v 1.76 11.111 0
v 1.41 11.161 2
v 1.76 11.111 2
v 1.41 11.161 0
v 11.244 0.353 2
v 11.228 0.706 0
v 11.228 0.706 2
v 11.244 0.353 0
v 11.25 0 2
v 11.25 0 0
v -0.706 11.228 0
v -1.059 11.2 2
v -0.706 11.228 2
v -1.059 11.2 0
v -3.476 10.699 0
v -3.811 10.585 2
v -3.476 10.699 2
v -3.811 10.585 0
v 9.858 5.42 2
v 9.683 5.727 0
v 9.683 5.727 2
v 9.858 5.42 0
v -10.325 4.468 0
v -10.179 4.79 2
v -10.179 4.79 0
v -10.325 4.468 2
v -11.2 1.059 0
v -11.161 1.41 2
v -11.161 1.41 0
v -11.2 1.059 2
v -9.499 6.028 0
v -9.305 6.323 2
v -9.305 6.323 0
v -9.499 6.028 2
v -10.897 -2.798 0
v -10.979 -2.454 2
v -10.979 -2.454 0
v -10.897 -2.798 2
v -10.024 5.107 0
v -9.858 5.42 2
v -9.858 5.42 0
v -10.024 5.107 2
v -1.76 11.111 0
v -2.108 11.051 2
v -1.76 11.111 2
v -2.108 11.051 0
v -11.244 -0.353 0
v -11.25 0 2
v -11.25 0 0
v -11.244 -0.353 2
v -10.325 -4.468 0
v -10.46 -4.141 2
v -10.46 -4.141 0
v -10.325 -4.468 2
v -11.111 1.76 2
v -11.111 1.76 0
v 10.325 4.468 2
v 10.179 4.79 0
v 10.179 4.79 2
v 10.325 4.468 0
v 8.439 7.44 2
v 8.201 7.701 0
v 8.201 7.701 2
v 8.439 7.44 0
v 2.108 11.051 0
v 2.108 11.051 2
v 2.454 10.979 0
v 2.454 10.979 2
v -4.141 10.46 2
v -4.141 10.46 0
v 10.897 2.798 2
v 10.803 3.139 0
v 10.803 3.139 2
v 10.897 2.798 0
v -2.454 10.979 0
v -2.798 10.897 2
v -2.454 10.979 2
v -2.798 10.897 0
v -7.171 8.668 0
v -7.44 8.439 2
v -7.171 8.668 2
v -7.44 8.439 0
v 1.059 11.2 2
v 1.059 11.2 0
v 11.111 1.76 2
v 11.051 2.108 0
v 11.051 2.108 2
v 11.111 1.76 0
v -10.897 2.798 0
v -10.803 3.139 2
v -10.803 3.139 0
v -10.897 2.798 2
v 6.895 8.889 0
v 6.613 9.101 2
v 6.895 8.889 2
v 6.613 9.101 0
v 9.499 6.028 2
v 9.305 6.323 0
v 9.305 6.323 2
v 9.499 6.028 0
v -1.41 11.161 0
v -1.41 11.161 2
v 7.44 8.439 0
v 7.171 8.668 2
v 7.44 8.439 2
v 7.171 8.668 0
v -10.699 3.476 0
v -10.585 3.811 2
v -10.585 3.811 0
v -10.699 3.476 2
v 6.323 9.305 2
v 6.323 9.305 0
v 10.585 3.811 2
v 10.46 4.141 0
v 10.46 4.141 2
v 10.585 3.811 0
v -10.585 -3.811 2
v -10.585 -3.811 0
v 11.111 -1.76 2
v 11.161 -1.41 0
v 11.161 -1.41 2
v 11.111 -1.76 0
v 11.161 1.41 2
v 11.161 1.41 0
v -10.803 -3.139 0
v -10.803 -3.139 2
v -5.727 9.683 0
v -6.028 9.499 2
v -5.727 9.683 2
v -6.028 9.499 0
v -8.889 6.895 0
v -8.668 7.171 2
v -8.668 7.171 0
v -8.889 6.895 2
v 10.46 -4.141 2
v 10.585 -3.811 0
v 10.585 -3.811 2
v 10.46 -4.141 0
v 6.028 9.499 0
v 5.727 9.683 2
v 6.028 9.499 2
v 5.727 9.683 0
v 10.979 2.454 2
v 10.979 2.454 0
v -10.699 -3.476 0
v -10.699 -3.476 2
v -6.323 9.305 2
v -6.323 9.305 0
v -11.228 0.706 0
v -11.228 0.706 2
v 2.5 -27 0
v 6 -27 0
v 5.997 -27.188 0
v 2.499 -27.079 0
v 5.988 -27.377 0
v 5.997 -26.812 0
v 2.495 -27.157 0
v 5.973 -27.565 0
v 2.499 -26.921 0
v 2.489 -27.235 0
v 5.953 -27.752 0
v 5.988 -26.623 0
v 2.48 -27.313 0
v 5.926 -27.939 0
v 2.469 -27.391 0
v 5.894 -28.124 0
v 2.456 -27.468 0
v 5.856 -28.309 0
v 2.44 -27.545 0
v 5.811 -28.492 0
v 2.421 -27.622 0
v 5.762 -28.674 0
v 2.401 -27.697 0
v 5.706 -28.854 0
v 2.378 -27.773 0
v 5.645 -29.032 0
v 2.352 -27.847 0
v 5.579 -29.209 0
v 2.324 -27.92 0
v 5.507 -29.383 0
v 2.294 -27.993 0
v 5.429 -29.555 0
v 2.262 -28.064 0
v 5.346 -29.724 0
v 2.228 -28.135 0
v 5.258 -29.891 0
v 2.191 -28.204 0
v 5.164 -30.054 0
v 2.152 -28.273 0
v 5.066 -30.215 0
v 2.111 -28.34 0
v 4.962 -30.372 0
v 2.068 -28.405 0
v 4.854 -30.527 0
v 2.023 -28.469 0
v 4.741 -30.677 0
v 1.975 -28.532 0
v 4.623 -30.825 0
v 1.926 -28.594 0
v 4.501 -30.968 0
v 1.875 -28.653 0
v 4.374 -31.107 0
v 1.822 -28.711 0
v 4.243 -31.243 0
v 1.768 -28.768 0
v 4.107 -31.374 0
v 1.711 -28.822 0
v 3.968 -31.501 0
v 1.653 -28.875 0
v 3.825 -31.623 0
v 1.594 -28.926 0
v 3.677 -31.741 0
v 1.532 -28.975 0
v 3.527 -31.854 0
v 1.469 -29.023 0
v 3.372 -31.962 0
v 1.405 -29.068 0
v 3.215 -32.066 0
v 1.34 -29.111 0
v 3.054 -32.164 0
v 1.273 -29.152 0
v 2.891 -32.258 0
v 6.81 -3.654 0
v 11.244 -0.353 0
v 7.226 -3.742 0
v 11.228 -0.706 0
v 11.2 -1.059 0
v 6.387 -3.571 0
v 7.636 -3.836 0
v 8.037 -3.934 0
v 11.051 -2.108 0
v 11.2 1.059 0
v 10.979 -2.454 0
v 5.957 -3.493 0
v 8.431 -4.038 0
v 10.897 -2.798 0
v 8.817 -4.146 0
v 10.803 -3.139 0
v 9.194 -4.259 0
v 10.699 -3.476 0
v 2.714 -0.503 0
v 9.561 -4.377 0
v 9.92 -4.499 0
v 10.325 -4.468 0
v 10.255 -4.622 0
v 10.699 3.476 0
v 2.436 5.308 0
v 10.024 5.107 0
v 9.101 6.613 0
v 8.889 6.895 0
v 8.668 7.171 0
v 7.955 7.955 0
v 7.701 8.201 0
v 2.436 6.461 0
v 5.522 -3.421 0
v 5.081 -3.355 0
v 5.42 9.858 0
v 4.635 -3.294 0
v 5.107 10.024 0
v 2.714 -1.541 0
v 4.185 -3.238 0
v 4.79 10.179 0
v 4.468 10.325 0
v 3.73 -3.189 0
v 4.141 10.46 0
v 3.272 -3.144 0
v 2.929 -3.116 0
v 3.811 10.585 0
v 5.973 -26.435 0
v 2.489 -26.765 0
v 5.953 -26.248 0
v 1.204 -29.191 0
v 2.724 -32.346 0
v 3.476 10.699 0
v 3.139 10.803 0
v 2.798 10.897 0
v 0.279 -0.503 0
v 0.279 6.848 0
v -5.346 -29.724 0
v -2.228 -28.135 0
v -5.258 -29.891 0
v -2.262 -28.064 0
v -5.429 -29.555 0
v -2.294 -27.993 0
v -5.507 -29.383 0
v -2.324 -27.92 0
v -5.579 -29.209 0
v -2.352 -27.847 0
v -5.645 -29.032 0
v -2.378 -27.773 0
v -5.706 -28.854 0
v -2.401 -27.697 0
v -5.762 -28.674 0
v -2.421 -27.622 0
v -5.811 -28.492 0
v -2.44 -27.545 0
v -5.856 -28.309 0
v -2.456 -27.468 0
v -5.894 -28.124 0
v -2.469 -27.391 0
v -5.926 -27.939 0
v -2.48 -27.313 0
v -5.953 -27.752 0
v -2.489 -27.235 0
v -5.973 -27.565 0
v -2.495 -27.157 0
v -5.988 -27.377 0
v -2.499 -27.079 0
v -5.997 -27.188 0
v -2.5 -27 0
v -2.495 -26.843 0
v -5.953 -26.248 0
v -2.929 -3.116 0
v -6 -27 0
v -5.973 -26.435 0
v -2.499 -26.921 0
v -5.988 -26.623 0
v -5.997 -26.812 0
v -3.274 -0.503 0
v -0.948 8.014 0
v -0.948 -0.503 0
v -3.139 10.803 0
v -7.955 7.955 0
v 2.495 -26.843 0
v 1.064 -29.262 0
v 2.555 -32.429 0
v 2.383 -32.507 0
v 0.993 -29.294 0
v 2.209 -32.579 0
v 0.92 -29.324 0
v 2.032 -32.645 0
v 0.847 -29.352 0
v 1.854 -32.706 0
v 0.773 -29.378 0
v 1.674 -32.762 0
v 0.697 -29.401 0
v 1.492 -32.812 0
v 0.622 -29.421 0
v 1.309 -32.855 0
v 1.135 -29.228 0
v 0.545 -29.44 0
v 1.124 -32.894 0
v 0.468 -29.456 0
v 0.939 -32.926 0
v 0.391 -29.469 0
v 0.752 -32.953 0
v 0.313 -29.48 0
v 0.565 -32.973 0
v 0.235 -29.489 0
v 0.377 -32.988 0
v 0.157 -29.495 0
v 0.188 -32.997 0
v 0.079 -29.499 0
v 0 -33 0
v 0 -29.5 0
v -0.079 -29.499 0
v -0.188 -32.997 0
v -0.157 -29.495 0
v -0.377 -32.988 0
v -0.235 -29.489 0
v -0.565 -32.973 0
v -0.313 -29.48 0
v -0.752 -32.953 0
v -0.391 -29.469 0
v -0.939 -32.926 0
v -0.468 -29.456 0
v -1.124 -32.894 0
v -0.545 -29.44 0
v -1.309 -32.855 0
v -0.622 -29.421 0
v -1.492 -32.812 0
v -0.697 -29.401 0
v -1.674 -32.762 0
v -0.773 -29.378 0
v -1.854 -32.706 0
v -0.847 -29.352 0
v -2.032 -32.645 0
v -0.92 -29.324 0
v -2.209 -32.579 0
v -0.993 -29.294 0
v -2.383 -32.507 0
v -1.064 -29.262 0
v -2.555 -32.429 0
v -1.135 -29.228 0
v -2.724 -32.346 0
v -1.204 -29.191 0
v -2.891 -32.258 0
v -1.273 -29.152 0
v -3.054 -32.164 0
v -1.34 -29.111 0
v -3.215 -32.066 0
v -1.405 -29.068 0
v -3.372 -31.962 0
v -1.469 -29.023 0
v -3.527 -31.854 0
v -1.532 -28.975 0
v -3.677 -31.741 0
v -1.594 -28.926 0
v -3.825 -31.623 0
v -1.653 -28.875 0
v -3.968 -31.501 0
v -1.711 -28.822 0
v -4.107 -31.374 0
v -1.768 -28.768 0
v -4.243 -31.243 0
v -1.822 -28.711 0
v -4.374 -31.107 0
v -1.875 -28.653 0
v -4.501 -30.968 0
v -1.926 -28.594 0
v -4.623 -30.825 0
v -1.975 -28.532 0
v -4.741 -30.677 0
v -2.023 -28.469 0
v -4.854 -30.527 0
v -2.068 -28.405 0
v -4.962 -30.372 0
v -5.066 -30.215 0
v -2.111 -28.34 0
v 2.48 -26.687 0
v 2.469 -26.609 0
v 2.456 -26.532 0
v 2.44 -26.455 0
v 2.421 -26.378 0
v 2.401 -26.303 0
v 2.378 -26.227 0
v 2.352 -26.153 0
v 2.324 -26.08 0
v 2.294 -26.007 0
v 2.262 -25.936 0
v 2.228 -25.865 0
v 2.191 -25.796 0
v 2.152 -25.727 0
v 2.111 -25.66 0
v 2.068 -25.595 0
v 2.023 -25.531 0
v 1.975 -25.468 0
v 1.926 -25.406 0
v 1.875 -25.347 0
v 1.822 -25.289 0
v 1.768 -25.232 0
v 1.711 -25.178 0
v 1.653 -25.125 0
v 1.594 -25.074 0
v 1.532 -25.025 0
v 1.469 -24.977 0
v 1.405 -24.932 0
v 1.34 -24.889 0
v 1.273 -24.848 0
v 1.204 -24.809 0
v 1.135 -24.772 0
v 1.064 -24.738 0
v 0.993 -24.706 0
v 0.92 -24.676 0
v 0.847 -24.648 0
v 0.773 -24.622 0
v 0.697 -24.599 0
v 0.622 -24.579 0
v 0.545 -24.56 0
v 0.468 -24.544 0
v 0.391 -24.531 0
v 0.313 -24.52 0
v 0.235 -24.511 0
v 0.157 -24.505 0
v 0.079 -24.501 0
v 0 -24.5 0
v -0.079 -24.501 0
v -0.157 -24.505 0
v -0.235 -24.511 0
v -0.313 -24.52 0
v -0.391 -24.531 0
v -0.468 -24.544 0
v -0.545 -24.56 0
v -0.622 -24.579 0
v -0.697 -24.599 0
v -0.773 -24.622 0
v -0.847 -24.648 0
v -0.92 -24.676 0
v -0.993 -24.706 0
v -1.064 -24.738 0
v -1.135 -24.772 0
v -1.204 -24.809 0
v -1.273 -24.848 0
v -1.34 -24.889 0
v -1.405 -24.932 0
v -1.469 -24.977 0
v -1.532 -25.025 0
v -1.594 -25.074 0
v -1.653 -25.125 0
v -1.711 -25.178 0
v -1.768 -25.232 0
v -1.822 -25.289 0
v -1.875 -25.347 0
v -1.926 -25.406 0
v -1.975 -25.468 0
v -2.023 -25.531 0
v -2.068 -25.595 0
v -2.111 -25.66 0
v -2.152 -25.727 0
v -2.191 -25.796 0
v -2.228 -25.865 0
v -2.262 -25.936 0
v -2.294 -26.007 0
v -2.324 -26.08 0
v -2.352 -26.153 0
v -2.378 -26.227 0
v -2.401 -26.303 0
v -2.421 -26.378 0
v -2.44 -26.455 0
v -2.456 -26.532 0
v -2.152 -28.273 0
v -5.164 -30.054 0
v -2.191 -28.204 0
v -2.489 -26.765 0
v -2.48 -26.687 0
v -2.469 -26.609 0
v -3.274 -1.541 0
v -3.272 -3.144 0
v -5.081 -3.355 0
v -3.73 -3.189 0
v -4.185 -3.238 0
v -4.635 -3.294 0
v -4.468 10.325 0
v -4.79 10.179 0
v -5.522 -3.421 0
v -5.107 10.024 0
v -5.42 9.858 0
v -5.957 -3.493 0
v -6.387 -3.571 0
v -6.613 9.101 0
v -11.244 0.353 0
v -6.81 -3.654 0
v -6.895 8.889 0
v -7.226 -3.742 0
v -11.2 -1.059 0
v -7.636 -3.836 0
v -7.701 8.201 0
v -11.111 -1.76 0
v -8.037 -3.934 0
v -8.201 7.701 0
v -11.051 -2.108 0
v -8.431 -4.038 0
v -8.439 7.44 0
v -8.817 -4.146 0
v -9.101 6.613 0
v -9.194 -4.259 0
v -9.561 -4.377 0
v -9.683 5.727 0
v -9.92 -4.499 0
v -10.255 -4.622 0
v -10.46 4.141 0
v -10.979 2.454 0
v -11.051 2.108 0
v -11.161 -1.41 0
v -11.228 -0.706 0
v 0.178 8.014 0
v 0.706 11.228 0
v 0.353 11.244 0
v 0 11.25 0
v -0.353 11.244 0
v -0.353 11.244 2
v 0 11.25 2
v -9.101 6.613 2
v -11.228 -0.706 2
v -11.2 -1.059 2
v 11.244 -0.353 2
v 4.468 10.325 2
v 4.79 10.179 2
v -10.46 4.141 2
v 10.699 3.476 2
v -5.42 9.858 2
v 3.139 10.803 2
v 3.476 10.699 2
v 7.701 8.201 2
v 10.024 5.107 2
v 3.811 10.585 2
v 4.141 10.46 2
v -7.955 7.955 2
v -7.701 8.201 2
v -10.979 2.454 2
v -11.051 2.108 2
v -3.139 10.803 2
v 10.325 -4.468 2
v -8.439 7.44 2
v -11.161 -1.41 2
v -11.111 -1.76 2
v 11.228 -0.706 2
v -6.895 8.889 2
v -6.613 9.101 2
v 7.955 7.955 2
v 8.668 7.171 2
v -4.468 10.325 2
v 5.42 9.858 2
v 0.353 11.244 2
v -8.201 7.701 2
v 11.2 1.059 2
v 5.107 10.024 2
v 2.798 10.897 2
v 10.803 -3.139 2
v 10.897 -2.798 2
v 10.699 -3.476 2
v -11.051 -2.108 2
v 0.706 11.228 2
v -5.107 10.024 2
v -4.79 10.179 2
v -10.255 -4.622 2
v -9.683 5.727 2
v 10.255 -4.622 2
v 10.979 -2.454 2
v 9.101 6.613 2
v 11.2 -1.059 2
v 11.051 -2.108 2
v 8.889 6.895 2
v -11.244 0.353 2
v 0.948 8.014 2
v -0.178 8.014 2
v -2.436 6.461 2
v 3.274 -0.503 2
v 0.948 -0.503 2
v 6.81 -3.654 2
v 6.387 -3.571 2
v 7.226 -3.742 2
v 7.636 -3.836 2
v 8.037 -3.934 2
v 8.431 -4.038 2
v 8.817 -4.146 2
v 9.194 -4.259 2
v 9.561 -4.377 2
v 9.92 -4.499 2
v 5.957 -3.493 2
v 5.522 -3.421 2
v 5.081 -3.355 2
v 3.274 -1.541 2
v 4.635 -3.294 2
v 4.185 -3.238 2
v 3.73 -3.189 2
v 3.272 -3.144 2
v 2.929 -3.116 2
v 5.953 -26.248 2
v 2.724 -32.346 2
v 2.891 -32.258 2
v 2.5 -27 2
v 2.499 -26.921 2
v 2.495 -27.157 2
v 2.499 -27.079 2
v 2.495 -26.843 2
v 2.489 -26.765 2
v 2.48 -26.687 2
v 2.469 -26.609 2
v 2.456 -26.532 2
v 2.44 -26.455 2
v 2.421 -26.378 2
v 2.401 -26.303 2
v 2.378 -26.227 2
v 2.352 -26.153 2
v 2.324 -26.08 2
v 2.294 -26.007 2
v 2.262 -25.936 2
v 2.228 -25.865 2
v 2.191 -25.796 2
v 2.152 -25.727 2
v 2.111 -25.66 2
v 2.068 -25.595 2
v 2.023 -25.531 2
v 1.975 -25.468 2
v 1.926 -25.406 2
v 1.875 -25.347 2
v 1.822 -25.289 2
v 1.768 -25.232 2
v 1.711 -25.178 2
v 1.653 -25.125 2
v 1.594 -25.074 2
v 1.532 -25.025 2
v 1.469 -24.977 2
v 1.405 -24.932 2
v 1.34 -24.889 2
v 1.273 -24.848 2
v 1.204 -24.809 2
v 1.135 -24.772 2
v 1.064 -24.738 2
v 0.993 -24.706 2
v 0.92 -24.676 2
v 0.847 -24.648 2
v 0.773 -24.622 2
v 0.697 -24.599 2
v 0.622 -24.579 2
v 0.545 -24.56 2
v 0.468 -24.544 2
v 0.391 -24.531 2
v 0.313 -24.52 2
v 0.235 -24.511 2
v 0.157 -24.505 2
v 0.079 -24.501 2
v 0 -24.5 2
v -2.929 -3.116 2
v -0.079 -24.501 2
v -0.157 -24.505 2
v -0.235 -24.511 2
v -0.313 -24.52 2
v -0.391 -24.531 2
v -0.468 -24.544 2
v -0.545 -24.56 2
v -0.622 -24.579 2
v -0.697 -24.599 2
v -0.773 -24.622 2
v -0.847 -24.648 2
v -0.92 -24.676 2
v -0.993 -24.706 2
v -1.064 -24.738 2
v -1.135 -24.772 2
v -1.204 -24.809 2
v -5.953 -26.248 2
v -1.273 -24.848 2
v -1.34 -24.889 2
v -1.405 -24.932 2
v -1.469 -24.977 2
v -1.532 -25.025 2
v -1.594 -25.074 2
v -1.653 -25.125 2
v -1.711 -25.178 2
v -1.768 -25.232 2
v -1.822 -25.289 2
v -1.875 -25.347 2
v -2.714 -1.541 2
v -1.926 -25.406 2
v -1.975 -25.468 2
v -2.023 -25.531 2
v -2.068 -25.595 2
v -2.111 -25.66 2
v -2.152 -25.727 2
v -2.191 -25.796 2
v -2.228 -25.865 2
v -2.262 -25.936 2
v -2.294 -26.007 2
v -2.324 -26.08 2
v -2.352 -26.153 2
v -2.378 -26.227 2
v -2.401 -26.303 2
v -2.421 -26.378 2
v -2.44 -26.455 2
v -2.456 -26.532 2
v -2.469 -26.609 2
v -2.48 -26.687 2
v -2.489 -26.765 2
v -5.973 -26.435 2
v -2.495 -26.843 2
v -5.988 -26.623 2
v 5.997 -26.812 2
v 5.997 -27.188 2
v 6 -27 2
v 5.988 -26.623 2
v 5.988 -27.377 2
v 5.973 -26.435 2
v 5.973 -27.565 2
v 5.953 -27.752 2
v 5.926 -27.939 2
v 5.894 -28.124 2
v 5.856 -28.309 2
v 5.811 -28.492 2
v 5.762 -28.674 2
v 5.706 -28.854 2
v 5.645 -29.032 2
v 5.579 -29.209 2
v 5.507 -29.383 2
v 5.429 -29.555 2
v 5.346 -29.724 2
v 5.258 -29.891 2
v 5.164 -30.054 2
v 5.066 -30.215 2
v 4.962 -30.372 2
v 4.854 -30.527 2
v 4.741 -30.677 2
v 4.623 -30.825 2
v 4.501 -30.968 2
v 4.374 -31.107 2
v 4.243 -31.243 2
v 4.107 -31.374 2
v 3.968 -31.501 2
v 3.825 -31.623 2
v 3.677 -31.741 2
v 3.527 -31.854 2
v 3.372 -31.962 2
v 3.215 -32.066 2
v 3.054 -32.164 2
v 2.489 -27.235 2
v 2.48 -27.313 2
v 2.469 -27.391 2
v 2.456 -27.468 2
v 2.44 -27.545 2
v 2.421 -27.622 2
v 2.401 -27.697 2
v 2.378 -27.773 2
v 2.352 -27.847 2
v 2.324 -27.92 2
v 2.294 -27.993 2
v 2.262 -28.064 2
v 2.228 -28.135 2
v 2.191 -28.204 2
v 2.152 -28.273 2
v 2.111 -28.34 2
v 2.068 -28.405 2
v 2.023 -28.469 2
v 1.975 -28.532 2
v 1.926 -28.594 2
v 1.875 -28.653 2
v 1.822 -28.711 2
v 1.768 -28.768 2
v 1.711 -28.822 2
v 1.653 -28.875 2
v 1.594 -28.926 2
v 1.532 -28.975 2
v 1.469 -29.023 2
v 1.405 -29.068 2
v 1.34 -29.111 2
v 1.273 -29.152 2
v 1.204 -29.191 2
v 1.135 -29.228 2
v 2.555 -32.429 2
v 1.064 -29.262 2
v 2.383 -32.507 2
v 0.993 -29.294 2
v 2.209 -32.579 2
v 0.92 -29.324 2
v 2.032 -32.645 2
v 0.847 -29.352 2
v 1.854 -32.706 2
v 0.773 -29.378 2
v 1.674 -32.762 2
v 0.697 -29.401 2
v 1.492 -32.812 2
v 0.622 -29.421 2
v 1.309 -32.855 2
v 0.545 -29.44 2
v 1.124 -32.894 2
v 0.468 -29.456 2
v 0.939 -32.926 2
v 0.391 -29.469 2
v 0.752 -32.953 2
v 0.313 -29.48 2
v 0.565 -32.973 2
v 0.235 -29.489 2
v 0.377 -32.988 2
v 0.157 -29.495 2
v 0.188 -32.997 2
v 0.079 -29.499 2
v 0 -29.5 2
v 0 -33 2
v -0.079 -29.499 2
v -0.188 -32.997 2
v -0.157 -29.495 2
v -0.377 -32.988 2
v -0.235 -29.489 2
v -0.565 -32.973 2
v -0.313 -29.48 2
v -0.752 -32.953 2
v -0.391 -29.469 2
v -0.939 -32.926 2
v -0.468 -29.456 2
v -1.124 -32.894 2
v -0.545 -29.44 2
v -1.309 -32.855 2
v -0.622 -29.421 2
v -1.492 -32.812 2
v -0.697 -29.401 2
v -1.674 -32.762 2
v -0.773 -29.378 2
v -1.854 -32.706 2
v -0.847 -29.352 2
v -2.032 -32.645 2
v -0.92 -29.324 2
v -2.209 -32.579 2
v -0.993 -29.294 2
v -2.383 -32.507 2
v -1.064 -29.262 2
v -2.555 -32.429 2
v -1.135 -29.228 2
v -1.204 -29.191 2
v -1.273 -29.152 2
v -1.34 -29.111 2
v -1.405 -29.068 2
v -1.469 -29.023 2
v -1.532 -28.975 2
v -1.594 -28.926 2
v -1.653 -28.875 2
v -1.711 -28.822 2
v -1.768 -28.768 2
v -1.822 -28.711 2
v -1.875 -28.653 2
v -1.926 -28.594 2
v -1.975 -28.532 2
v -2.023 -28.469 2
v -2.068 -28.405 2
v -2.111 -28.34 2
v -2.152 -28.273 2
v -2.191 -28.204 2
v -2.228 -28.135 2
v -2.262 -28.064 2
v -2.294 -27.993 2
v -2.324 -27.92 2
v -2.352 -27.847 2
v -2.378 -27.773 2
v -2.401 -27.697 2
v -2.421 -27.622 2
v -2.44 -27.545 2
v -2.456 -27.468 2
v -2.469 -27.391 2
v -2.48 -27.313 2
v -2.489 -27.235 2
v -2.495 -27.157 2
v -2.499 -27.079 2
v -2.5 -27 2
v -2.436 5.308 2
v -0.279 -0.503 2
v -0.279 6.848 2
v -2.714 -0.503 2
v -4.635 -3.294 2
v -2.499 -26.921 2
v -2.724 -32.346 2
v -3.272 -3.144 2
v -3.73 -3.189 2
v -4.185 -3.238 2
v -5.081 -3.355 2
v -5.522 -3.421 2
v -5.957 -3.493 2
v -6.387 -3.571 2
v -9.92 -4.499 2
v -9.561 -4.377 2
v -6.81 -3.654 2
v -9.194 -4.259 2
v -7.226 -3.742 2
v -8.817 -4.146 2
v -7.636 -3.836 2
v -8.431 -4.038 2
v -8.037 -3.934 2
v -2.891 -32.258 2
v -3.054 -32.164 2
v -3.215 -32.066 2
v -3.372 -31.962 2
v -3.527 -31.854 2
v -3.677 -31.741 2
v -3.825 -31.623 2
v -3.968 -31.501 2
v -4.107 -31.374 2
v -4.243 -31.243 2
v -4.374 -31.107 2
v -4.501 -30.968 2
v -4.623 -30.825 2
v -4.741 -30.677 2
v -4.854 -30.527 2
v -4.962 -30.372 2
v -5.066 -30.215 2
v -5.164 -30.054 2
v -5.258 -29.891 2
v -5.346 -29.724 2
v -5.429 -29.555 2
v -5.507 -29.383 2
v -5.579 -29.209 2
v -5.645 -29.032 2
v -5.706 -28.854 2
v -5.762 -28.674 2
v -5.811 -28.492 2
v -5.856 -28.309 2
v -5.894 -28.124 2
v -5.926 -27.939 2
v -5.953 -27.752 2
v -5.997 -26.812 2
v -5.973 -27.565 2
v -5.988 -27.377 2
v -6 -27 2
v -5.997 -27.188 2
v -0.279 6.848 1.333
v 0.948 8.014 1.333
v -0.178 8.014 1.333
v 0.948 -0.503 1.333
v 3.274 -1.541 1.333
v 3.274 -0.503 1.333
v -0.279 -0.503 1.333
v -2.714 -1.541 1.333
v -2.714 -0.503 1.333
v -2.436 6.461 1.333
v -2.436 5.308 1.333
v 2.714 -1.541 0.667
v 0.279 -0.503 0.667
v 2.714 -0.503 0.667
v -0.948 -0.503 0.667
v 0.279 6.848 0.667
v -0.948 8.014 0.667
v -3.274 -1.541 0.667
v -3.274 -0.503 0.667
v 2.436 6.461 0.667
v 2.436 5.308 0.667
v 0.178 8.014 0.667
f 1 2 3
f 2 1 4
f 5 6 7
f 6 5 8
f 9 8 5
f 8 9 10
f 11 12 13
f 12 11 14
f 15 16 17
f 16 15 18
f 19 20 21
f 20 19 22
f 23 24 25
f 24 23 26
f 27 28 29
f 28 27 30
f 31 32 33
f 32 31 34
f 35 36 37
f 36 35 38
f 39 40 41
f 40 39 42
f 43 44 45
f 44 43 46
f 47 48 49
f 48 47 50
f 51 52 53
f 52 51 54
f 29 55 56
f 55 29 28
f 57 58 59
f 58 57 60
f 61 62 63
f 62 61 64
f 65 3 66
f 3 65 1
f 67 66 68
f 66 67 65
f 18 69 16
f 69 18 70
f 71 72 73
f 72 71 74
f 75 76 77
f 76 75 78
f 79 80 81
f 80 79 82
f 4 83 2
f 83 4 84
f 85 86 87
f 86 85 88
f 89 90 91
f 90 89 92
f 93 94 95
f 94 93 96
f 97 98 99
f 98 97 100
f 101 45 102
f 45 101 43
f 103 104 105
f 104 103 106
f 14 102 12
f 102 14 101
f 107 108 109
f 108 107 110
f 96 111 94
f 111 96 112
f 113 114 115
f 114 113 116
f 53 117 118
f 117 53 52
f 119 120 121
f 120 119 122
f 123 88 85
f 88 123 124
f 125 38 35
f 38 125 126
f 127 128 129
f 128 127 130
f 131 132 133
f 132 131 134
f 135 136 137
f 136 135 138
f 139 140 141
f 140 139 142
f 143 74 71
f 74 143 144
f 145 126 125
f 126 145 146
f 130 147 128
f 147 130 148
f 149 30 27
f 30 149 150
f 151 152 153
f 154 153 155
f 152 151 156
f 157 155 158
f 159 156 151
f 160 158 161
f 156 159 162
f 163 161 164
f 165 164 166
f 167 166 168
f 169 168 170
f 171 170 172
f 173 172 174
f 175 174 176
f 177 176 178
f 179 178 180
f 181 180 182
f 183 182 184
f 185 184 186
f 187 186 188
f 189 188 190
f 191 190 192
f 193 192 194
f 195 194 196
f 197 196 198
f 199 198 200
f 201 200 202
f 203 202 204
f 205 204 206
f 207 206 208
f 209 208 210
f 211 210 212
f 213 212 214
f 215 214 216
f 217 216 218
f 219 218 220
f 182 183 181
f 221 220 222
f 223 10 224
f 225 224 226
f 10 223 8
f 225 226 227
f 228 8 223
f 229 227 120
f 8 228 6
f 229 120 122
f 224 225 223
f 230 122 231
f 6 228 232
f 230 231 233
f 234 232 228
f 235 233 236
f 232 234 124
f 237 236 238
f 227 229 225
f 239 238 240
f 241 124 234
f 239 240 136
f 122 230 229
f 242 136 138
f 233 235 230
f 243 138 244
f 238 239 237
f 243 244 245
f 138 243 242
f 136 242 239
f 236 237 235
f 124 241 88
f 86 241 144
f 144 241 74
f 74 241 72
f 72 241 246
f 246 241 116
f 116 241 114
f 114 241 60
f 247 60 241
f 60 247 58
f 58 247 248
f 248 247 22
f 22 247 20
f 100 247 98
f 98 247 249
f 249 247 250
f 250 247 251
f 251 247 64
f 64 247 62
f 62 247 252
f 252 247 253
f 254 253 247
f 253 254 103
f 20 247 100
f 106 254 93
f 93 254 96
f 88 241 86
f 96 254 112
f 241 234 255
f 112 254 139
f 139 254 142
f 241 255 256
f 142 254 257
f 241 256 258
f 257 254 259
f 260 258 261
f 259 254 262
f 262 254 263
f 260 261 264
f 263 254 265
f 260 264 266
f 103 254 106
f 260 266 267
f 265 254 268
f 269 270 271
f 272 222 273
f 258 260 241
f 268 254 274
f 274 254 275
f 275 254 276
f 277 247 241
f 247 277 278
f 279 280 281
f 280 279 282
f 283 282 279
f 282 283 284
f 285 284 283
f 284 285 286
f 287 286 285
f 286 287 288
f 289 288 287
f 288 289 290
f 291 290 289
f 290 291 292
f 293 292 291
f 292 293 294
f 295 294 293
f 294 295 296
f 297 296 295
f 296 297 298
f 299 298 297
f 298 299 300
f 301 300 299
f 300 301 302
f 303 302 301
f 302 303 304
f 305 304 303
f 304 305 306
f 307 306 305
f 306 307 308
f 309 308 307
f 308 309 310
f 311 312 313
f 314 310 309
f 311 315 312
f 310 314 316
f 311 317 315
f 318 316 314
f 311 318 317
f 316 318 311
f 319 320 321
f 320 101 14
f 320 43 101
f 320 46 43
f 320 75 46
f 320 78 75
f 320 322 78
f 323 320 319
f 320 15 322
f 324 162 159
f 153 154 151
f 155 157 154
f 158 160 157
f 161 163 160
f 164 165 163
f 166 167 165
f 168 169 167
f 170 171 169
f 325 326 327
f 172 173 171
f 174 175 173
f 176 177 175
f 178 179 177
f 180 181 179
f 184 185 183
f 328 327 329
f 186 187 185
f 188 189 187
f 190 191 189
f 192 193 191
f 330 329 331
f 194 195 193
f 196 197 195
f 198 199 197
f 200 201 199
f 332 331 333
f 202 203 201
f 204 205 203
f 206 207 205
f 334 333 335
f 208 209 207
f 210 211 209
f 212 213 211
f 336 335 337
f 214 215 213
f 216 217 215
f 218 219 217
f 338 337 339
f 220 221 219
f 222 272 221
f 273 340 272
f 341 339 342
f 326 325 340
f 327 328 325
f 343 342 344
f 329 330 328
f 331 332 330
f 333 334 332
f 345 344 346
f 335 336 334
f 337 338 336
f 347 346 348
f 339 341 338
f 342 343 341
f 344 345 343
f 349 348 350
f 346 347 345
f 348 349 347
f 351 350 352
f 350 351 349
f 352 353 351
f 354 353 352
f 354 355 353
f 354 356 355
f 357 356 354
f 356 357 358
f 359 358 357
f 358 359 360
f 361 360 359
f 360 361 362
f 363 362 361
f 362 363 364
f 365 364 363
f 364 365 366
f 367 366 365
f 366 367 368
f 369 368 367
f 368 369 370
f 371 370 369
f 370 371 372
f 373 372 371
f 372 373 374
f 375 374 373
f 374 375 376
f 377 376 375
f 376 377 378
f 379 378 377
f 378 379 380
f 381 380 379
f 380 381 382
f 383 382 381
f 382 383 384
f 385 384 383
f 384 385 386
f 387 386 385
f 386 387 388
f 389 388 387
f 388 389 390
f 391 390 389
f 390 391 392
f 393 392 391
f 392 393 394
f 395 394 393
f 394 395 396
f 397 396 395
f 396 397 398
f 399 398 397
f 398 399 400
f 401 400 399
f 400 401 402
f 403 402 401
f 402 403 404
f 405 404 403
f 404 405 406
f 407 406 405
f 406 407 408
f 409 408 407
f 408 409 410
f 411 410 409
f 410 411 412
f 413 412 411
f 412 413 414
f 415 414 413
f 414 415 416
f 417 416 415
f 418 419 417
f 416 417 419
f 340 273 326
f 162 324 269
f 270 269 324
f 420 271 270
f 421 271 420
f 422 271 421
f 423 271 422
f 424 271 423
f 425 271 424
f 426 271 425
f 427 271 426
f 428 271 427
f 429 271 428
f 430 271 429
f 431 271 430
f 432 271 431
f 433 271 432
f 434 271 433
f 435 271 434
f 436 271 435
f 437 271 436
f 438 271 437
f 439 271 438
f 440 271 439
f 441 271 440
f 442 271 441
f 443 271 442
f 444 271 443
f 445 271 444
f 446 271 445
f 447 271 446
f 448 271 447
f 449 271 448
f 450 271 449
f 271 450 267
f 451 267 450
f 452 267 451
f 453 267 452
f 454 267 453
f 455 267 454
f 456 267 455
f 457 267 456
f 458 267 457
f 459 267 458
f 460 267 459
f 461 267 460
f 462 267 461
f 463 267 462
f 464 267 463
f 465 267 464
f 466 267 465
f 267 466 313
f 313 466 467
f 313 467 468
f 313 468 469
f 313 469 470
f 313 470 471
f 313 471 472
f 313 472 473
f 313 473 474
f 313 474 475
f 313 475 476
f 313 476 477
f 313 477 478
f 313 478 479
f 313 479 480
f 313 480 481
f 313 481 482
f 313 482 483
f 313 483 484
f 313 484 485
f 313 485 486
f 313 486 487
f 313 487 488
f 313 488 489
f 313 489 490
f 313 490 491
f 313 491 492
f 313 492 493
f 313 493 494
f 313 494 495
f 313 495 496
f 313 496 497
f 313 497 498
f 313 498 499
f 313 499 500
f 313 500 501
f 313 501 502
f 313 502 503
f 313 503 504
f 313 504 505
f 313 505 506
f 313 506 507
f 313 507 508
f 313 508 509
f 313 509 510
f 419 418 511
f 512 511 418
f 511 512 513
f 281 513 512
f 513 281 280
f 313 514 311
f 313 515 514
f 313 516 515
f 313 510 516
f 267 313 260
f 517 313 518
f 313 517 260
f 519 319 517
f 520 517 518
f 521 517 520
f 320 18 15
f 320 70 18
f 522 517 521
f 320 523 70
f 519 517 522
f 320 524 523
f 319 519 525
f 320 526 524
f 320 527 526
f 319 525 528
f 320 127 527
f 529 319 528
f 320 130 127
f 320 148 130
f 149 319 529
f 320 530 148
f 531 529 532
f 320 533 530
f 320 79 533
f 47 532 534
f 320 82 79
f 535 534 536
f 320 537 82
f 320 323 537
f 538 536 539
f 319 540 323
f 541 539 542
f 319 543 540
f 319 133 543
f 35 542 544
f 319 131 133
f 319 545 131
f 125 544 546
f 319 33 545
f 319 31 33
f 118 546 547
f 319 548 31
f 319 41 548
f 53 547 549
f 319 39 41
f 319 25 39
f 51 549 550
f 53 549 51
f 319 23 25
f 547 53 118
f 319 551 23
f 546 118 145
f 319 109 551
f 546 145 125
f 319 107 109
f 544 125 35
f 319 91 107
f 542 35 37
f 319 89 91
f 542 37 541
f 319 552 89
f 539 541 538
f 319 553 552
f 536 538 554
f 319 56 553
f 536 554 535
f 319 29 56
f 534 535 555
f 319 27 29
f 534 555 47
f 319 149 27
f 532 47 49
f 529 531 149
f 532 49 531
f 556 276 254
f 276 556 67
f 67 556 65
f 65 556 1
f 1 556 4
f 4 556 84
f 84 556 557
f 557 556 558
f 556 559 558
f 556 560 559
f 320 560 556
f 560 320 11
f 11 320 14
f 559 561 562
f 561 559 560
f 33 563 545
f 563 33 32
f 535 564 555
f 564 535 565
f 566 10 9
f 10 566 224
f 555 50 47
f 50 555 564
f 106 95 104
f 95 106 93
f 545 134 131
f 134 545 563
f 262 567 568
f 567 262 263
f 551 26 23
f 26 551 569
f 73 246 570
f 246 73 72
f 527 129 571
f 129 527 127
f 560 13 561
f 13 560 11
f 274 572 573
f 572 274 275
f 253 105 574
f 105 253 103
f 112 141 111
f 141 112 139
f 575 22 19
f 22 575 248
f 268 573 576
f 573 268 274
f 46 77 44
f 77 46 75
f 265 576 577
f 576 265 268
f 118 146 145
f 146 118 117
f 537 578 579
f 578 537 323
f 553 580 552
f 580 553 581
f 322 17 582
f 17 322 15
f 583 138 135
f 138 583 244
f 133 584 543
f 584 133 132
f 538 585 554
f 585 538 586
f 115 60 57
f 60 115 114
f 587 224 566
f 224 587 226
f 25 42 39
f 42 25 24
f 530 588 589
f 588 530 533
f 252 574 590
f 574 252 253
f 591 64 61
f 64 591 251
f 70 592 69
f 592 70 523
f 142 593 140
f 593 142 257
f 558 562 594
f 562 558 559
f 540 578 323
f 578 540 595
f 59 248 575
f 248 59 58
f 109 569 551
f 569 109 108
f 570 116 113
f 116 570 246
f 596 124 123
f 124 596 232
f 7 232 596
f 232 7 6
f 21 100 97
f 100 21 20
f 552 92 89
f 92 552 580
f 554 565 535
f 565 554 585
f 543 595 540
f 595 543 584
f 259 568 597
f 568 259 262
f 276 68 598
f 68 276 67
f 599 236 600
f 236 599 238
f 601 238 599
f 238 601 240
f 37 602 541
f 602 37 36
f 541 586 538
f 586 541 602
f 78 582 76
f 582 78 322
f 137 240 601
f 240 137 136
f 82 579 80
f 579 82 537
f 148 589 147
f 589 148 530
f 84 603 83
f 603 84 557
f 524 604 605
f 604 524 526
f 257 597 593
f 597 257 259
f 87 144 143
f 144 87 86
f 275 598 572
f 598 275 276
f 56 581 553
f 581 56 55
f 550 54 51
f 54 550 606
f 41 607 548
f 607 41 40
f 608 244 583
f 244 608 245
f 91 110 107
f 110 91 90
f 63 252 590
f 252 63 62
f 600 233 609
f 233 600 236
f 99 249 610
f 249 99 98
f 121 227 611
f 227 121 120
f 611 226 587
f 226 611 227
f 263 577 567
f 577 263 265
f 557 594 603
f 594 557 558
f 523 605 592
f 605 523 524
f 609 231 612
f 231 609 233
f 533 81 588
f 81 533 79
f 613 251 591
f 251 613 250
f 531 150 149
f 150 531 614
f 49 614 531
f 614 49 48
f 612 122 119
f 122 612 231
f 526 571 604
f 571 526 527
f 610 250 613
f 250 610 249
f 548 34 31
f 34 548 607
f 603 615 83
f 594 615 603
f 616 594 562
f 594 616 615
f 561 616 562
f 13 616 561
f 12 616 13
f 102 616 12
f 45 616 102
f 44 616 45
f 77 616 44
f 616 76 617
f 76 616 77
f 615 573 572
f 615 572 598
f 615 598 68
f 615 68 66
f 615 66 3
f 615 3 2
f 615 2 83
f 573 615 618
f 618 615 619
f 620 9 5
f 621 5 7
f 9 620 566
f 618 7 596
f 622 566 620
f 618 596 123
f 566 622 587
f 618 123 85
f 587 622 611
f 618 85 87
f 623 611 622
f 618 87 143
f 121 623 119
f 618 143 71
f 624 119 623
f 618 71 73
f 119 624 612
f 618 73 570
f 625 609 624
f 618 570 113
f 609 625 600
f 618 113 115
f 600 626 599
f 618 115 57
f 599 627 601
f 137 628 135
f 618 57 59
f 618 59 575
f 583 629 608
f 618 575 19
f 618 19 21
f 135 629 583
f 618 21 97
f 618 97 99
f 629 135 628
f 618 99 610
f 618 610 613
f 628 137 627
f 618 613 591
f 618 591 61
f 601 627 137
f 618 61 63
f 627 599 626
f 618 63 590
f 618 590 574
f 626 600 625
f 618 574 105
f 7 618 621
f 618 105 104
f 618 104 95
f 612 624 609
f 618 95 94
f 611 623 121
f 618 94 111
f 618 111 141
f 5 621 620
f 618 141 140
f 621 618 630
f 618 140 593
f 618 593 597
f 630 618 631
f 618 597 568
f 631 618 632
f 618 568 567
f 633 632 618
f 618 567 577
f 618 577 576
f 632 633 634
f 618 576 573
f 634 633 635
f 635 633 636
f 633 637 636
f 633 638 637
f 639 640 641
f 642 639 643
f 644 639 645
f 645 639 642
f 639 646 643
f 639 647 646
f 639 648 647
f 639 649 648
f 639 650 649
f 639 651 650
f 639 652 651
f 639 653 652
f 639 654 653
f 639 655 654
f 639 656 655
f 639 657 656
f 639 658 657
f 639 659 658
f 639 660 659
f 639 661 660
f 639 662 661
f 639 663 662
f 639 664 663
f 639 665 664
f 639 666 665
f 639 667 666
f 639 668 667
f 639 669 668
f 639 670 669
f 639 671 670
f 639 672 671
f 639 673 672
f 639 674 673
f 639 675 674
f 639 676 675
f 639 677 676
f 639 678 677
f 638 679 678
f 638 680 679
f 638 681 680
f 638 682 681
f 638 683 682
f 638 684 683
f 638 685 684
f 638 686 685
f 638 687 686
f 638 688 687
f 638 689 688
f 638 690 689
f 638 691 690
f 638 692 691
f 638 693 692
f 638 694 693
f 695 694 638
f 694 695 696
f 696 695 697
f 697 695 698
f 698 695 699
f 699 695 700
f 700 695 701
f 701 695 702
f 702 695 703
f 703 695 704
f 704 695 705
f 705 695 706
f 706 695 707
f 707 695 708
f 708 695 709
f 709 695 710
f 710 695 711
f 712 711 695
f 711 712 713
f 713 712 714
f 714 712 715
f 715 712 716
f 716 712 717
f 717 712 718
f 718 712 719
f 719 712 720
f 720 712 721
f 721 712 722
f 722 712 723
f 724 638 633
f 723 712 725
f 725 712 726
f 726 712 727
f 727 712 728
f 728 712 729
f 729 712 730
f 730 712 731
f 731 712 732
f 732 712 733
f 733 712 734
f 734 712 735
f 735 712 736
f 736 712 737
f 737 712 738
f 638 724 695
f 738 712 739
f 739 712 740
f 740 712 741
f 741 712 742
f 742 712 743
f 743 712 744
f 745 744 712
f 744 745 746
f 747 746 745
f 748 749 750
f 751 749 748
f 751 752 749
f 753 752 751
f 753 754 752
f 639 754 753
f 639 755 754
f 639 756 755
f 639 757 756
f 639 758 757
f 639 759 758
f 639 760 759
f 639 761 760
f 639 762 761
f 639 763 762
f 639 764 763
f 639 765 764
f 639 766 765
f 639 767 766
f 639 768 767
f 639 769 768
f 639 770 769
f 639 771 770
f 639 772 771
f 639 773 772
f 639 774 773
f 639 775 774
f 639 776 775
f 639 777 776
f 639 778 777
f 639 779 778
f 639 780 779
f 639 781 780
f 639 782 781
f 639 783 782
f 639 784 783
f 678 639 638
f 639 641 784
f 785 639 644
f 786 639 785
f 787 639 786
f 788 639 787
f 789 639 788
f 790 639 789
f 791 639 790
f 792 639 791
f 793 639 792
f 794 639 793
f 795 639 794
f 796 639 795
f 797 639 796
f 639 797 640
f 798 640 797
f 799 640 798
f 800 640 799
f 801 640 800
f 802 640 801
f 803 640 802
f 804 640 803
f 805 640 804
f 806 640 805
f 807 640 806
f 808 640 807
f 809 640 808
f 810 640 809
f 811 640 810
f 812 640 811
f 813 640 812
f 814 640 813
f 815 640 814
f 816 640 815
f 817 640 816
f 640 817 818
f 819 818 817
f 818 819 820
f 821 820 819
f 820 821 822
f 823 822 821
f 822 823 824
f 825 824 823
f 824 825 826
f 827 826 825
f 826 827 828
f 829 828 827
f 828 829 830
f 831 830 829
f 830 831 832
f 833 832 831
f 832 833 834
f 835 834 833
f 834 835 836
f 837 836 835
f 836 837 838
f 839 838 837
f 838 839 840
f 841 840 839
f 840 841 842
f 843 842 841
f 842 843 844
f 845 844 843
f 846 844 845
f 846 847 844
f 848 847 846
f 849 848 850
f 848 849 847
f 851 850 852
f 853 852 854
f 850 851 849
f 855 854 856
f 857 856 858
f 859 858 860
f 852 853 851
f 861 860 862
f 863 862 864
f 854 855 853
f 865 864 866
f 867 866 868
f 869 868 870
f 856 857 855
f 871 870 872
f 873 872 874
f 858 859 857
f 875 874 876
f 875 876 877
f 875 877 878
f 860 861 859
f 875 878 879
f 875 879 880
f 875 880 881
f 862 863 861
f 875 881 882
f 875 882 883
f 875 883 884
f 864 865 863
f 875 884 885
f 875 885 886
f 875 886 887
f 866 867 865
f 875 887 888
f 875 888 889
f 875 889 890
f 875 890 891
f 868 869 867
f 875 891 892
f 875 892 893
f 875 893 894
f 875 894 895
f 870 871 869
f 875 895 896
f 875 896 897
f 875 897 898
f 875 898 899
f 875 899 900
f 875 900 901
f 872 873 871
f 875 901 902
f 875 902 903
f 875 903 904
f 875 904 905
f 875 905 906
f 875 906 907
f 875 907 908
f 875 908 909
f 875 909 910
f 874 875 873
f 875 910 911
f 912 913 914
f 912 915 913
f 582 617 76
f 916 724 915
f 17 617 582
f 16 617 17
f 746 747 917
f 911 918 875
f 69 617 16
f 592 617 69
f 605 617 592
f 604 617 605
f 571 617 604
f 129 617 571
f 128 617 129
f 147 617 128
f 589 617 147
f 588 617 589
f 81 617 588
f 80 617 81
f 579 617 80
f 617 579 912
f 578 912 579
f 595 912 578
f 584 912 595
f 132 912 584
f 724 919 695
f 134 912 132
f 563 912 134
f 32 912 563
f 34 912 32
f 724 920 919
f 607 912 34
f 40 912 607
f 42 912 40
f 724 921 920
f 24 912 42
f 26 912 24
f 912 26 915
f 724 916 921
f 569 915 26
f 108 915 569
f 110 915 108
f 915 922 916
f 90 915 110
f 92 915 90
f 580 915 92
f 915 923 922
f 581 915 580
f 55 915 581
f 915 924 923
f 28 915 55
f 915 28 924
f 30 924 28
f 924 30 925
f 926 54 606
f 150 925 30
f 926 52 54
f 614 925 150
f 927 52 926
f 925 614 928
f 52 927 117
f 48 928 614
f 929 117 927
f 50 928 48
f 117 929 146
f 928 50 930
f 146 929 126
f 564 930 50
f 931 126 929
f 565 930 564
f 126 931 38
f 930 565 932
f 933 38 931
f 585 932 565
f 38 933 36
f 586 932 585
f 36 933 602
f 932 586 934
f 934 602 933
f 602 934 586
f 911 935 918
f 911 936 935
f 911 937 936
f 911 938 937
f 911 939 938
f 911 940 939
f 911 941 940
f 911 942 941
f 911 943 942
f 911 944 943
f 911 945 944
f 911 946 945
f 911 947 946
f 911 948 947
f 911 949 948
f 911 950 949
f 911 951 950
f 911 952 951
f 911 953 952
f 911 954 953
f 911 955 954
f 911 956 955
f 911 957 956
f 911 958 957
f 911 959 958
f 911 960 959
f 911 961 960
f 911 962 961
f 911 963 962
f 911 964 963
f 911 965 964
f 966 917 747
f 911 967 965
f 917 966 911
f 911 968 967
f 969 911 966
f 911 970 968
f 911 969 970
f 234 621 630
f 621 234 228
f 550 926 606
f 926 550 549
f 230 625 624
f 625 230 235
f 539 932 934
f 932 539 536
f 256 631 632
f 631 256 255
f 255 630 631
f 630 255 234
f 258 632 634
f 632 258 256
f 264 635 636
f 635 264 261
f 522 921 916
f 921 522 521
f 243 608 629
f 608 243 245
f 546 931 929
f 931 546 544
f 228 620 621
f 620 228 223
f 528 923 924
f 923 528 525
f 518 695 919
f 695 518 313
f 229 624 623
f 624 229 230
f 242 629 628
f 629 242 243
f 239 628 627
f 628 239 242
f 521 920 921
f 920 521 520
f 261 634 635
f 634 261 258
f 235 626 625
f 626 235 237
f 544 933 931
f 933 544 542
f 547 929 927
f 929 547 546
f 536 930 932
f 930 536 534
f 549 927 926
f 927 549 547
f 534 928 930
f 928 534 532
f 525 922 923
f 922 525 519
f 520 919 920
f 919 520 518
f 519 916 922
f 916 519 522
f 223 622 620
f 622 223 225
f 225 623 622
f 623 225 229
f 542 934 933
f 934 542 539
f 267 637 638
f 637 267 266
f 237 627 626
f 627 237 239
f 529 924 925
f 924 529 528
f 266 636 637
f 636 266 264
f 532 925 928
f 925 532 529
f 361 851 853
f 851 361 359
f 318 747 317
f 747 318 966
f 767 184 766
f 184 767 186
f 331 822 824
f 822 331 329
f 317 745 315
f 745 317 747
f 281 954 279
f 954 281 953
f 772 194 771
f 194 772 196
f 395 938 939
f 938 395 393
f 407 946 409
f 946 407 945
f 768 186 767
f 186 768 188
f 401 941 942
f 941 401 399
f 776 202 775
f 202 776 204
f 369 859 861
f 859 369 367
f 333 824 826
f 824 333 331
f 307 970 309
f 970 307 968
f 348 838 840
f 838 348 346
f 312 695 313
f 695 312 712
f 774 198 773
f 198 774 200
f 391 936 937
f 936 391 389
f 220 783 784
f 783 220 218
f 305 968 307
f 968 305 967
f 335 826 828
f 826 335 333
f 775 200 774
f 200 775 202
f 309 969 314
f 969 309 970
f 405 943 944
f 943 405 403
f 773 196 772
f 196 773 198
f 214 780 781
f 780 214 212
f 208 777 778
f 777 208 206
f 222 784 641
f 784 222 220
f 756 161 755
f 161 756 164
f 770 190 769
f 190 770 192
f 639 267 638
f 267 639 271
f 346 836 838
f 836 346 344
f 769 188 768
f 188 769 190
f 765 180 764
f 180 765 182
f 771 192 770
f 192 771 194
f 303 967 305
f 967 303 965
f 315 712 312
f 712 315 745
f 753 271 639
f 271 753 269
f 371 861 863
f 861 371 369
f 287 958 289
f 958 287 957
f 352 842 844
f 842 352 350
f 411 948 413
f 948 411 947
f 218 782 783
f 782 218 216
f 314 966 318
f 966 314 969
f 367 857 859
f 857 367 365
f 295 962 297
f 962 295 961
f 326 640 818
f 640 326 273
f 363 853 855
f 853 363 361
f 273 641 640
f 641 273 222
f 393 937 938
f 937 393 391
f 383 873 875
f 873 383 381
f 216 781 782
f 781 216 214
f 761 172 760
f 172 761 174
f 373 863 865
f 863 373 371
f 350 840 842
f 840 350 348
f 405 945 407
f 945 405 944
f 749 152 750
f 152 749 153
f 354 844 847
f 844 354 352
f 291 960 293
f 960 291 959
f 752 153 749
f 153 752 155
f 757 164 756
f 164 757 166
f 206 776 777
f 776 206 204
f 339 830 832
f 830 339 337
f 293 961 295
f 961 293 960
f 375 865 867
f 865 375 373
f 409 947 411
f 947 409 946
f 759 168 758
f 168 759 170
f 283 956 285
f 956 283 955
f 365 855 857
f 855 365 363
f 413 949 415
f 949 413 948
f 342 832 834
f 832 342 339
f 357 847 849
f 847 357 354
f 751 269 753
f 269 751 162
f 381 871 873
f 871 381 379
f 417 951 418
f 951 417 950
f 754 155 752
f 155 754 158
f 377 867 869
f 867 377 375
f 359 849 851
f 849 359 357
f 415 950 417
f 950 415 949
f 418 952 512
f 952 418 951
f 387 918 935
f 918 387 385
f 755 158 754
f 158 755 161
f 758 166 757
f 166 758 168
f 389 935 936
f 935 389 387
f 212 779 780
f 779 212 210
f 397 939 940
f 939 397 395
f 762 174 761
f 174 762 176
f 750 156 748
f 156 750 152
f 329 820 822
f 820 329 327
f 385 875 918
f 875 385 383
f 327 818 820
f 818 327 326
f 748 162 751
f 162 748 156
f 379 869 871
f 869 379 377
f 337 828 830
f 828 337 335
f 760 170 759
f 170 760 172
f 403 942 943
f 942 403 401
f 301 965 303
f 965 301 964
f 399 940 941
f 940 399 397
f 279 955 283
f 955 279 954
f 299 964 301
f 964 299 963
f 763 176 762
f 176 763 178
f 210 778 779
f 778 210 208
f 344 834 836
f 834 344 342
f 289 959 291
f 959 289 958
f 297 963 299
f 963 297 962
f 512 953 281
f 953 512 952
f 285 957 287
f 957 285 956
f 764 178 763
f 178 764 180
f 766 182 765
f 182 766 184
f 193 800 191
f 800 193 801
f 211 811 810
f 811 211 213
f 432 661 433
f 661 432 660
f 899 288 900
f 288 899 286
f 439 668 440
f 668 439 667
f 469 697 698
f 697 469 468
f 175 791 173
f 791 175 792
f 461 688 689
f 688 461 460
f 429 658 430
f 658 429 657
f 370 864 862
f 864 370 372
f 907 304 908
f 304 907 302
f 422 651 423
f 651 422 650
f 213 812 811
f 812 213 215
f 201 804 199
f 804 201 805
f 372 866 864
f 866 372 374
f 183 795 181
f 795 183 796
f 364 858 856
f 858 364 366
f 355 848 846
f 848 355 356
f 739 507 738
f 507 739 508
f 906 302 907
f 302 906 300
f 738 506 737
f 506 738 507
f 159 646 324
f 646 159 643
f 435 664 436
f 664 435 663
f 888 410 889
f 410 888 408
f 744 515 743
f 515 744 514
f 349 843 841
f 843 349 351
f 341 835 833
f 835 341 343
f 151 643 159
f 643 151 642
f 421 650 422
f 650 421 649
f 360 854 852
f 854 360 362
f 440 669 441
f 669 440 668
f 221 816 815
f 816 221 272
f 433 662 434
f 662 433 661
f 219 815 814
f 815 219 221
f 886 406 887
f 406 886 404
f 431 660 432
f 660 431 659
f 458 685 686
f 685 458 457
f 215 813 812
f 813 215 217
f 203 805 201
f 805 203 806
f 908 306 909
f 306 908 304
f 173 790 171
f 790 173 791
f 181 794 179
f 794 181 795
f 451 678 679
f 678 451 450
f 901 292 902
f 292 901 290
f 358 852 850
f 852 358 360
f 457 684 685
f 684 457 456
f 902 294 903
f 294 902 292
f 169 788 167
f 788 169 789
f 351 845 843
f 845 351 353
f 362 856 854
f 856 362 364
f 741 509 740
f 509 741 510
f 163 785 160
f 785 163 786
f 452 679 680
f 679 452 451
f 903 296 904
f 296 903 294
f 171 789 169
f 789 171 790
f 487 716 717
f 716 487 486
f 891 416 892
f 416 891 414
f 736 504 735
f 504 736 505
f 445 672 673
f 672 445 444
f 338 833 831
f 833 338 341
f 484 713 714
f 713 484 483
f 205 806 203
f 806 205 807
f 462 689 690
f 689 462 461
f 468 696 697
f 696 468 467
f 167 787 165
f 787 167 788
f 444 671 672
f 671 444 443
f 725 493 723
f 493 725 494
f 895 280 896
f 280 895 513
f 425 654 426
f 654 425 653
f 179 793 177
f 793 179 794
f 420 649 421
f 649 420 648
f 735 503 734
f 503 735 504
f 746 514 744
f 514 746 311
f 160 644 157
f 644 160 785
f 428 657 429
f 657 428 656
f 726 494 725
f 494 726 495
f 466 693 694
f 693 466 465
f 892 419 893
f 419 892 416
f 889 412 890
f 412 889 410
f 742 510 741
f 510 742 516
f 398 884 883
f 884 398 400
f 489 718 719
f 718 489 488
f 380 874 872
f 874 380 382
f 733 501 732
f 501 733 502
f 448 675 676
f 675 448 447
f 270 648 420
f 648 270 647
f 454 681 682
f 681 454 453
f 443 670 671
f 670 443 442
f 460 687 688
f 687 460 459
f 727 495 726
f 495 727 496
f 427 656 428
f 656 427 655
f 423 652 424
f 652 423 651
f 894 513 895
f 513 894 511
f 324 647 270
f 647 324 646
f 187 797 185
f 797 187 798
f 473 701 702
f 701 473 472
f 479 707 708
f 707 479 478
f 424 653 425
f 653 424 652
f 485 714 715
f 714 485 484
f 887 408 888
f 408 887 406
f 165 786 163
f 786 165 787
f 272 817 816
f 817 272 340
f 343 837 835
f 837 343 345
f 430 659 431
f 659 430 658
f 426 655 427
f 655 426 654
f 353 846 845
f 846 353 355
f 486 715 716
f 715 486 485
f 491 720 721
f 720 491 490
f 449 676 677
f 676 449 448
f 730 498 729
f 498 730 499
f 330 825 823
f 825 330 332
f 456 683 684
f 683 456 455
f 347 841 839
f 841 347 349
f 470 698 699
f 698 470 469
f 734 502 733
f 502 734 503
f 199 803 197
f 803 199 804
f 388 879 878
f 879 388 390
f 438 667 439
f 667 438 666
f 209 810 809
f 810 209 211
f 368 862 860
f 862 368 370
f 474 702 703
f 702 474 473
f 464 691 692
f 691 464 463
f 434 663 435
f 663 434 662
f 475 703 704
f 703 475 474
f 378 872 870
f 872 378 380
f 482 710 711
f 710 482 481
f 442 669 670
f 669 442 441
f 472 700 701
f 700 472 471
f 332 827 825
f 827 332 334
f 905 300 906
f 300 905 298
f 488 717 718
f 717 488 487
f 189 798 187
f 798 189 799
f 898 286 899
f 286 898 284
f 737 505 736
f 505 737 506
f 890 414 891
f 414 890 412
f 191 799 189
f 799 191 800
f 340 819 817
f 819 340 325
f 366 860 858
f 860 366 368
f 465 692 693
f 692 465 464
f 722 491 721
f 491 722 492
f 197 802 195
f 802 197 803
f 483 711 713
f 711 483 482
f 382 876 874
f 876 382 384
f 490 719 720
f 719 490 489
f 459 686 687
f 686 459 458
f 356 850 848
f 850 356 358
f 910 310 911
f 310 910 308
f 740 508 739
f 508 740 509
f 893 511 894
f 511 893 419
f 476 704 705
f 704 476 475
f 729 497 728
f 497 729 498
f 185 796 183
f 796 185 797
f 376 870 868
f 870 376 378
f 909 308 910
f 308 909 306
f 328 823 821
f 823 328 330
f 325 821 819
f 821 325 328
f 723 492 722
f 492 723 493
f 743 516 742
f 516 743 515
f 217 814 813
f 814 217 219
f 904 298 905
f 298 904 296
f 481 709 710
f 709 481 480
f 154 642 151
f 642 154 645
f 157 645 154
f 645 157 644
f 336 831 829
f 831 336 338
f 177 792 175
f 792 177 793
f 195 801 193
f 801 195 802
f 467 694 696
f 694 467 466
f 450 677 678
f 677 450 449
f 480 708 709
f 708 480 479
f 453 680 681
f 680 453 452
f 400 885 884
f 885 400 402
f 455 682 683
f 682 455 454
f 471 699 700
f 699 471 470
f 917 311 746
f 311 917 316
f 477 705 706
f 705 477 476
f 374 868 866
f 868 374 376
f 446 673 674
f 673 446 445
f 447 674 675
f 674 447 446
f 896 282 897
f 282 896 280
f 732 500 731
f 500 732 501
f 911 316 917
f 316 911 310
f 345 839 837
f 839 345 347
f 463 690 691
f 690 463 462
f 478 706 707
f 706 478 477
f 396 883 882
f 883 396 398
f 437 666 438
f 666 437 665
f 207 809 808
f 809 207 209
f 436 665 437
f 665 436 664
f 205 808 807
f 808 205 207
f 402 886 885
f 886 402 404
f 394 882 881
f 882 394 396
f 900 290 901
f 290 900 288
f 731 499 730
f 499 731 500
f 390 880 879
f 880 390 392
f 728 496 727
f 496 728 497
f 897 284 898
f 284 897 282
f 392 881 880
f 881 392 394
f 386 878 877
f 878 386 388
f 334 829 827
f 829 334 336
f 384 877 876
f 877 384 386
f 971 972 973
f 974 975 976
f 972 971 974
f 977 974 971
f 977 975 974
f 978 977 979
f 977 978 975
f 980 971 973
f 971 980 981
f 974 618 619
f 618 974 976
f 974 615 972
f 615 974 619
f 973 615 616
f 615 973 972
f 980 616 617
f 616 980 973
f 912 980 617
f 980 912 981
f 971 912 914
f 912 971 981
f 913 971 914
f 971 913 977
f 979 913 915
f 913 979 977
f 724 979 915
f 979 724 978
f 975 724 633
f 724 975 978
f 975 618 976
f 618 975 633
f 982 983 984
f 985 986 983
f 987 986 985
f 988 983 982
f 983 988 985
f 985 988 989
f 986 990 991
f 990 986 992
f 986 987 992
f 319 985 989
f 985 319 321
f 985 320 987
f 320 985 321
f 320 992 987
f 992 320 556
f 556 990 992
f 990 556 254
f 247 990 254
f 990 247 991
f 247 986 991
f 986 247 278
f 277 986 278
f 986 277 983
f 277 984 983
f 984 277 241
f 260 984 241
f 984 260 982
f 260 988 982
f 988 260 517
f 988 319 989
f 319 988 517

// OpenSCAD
d_coin = 22.5; // coin diameter, 22.5 for pound, 23.8 for euro
t_coin = 2; // coin thickness, 3.15 for pound, 2 for euro
d_hole = 5; // hole diameter
l_tail = 27; // distance from coin center to hole center
$fn = 200; // render quality
text="1";
font="Liberation Sans";
fontsize=10;

// put it all together
difference()
{
    tokenCoin();
    embossedText();
}

// functions
module tokenCoin()
{
    difference()
    {
        // coin
        cylinder(h=t_coin, d=d_coin);

        // cutout
        translate([0, -9, -0.5])
            scale([1, 0.4, 1])
                cylinder(h=t_coin+1, d=30);

    }

    difference()
    {
        // tail
        hull()
        {
            cylinder(h=t_coin, d=5);
            translate([0, -l_tail, 0])
                cylinder(h=t_coin, d=12);
        }

        // hole
        translate([0, -l_tail, -0.5])
            cylinder(h=t_coin+1, d=d_hole);
    }
}

module embossedText()
{
    union()
    {
        translate([0,d_coin/4-fontsize/4,t_coin*2/3])
            rotate([0,0,0])
                linear_extrude(height=t_coin/2)
                    text(text=text, font=font, halign="center", valign="center", size=fontsize);
        translate([0,d_coin/4-fontsize/4,t_coin/3])
            rotate([0,180,0])
                linear_extrude(height=t_coin/2)
                    text(text=text, font=font, halign="center", valign="center", size=fontsize);
    }
}
